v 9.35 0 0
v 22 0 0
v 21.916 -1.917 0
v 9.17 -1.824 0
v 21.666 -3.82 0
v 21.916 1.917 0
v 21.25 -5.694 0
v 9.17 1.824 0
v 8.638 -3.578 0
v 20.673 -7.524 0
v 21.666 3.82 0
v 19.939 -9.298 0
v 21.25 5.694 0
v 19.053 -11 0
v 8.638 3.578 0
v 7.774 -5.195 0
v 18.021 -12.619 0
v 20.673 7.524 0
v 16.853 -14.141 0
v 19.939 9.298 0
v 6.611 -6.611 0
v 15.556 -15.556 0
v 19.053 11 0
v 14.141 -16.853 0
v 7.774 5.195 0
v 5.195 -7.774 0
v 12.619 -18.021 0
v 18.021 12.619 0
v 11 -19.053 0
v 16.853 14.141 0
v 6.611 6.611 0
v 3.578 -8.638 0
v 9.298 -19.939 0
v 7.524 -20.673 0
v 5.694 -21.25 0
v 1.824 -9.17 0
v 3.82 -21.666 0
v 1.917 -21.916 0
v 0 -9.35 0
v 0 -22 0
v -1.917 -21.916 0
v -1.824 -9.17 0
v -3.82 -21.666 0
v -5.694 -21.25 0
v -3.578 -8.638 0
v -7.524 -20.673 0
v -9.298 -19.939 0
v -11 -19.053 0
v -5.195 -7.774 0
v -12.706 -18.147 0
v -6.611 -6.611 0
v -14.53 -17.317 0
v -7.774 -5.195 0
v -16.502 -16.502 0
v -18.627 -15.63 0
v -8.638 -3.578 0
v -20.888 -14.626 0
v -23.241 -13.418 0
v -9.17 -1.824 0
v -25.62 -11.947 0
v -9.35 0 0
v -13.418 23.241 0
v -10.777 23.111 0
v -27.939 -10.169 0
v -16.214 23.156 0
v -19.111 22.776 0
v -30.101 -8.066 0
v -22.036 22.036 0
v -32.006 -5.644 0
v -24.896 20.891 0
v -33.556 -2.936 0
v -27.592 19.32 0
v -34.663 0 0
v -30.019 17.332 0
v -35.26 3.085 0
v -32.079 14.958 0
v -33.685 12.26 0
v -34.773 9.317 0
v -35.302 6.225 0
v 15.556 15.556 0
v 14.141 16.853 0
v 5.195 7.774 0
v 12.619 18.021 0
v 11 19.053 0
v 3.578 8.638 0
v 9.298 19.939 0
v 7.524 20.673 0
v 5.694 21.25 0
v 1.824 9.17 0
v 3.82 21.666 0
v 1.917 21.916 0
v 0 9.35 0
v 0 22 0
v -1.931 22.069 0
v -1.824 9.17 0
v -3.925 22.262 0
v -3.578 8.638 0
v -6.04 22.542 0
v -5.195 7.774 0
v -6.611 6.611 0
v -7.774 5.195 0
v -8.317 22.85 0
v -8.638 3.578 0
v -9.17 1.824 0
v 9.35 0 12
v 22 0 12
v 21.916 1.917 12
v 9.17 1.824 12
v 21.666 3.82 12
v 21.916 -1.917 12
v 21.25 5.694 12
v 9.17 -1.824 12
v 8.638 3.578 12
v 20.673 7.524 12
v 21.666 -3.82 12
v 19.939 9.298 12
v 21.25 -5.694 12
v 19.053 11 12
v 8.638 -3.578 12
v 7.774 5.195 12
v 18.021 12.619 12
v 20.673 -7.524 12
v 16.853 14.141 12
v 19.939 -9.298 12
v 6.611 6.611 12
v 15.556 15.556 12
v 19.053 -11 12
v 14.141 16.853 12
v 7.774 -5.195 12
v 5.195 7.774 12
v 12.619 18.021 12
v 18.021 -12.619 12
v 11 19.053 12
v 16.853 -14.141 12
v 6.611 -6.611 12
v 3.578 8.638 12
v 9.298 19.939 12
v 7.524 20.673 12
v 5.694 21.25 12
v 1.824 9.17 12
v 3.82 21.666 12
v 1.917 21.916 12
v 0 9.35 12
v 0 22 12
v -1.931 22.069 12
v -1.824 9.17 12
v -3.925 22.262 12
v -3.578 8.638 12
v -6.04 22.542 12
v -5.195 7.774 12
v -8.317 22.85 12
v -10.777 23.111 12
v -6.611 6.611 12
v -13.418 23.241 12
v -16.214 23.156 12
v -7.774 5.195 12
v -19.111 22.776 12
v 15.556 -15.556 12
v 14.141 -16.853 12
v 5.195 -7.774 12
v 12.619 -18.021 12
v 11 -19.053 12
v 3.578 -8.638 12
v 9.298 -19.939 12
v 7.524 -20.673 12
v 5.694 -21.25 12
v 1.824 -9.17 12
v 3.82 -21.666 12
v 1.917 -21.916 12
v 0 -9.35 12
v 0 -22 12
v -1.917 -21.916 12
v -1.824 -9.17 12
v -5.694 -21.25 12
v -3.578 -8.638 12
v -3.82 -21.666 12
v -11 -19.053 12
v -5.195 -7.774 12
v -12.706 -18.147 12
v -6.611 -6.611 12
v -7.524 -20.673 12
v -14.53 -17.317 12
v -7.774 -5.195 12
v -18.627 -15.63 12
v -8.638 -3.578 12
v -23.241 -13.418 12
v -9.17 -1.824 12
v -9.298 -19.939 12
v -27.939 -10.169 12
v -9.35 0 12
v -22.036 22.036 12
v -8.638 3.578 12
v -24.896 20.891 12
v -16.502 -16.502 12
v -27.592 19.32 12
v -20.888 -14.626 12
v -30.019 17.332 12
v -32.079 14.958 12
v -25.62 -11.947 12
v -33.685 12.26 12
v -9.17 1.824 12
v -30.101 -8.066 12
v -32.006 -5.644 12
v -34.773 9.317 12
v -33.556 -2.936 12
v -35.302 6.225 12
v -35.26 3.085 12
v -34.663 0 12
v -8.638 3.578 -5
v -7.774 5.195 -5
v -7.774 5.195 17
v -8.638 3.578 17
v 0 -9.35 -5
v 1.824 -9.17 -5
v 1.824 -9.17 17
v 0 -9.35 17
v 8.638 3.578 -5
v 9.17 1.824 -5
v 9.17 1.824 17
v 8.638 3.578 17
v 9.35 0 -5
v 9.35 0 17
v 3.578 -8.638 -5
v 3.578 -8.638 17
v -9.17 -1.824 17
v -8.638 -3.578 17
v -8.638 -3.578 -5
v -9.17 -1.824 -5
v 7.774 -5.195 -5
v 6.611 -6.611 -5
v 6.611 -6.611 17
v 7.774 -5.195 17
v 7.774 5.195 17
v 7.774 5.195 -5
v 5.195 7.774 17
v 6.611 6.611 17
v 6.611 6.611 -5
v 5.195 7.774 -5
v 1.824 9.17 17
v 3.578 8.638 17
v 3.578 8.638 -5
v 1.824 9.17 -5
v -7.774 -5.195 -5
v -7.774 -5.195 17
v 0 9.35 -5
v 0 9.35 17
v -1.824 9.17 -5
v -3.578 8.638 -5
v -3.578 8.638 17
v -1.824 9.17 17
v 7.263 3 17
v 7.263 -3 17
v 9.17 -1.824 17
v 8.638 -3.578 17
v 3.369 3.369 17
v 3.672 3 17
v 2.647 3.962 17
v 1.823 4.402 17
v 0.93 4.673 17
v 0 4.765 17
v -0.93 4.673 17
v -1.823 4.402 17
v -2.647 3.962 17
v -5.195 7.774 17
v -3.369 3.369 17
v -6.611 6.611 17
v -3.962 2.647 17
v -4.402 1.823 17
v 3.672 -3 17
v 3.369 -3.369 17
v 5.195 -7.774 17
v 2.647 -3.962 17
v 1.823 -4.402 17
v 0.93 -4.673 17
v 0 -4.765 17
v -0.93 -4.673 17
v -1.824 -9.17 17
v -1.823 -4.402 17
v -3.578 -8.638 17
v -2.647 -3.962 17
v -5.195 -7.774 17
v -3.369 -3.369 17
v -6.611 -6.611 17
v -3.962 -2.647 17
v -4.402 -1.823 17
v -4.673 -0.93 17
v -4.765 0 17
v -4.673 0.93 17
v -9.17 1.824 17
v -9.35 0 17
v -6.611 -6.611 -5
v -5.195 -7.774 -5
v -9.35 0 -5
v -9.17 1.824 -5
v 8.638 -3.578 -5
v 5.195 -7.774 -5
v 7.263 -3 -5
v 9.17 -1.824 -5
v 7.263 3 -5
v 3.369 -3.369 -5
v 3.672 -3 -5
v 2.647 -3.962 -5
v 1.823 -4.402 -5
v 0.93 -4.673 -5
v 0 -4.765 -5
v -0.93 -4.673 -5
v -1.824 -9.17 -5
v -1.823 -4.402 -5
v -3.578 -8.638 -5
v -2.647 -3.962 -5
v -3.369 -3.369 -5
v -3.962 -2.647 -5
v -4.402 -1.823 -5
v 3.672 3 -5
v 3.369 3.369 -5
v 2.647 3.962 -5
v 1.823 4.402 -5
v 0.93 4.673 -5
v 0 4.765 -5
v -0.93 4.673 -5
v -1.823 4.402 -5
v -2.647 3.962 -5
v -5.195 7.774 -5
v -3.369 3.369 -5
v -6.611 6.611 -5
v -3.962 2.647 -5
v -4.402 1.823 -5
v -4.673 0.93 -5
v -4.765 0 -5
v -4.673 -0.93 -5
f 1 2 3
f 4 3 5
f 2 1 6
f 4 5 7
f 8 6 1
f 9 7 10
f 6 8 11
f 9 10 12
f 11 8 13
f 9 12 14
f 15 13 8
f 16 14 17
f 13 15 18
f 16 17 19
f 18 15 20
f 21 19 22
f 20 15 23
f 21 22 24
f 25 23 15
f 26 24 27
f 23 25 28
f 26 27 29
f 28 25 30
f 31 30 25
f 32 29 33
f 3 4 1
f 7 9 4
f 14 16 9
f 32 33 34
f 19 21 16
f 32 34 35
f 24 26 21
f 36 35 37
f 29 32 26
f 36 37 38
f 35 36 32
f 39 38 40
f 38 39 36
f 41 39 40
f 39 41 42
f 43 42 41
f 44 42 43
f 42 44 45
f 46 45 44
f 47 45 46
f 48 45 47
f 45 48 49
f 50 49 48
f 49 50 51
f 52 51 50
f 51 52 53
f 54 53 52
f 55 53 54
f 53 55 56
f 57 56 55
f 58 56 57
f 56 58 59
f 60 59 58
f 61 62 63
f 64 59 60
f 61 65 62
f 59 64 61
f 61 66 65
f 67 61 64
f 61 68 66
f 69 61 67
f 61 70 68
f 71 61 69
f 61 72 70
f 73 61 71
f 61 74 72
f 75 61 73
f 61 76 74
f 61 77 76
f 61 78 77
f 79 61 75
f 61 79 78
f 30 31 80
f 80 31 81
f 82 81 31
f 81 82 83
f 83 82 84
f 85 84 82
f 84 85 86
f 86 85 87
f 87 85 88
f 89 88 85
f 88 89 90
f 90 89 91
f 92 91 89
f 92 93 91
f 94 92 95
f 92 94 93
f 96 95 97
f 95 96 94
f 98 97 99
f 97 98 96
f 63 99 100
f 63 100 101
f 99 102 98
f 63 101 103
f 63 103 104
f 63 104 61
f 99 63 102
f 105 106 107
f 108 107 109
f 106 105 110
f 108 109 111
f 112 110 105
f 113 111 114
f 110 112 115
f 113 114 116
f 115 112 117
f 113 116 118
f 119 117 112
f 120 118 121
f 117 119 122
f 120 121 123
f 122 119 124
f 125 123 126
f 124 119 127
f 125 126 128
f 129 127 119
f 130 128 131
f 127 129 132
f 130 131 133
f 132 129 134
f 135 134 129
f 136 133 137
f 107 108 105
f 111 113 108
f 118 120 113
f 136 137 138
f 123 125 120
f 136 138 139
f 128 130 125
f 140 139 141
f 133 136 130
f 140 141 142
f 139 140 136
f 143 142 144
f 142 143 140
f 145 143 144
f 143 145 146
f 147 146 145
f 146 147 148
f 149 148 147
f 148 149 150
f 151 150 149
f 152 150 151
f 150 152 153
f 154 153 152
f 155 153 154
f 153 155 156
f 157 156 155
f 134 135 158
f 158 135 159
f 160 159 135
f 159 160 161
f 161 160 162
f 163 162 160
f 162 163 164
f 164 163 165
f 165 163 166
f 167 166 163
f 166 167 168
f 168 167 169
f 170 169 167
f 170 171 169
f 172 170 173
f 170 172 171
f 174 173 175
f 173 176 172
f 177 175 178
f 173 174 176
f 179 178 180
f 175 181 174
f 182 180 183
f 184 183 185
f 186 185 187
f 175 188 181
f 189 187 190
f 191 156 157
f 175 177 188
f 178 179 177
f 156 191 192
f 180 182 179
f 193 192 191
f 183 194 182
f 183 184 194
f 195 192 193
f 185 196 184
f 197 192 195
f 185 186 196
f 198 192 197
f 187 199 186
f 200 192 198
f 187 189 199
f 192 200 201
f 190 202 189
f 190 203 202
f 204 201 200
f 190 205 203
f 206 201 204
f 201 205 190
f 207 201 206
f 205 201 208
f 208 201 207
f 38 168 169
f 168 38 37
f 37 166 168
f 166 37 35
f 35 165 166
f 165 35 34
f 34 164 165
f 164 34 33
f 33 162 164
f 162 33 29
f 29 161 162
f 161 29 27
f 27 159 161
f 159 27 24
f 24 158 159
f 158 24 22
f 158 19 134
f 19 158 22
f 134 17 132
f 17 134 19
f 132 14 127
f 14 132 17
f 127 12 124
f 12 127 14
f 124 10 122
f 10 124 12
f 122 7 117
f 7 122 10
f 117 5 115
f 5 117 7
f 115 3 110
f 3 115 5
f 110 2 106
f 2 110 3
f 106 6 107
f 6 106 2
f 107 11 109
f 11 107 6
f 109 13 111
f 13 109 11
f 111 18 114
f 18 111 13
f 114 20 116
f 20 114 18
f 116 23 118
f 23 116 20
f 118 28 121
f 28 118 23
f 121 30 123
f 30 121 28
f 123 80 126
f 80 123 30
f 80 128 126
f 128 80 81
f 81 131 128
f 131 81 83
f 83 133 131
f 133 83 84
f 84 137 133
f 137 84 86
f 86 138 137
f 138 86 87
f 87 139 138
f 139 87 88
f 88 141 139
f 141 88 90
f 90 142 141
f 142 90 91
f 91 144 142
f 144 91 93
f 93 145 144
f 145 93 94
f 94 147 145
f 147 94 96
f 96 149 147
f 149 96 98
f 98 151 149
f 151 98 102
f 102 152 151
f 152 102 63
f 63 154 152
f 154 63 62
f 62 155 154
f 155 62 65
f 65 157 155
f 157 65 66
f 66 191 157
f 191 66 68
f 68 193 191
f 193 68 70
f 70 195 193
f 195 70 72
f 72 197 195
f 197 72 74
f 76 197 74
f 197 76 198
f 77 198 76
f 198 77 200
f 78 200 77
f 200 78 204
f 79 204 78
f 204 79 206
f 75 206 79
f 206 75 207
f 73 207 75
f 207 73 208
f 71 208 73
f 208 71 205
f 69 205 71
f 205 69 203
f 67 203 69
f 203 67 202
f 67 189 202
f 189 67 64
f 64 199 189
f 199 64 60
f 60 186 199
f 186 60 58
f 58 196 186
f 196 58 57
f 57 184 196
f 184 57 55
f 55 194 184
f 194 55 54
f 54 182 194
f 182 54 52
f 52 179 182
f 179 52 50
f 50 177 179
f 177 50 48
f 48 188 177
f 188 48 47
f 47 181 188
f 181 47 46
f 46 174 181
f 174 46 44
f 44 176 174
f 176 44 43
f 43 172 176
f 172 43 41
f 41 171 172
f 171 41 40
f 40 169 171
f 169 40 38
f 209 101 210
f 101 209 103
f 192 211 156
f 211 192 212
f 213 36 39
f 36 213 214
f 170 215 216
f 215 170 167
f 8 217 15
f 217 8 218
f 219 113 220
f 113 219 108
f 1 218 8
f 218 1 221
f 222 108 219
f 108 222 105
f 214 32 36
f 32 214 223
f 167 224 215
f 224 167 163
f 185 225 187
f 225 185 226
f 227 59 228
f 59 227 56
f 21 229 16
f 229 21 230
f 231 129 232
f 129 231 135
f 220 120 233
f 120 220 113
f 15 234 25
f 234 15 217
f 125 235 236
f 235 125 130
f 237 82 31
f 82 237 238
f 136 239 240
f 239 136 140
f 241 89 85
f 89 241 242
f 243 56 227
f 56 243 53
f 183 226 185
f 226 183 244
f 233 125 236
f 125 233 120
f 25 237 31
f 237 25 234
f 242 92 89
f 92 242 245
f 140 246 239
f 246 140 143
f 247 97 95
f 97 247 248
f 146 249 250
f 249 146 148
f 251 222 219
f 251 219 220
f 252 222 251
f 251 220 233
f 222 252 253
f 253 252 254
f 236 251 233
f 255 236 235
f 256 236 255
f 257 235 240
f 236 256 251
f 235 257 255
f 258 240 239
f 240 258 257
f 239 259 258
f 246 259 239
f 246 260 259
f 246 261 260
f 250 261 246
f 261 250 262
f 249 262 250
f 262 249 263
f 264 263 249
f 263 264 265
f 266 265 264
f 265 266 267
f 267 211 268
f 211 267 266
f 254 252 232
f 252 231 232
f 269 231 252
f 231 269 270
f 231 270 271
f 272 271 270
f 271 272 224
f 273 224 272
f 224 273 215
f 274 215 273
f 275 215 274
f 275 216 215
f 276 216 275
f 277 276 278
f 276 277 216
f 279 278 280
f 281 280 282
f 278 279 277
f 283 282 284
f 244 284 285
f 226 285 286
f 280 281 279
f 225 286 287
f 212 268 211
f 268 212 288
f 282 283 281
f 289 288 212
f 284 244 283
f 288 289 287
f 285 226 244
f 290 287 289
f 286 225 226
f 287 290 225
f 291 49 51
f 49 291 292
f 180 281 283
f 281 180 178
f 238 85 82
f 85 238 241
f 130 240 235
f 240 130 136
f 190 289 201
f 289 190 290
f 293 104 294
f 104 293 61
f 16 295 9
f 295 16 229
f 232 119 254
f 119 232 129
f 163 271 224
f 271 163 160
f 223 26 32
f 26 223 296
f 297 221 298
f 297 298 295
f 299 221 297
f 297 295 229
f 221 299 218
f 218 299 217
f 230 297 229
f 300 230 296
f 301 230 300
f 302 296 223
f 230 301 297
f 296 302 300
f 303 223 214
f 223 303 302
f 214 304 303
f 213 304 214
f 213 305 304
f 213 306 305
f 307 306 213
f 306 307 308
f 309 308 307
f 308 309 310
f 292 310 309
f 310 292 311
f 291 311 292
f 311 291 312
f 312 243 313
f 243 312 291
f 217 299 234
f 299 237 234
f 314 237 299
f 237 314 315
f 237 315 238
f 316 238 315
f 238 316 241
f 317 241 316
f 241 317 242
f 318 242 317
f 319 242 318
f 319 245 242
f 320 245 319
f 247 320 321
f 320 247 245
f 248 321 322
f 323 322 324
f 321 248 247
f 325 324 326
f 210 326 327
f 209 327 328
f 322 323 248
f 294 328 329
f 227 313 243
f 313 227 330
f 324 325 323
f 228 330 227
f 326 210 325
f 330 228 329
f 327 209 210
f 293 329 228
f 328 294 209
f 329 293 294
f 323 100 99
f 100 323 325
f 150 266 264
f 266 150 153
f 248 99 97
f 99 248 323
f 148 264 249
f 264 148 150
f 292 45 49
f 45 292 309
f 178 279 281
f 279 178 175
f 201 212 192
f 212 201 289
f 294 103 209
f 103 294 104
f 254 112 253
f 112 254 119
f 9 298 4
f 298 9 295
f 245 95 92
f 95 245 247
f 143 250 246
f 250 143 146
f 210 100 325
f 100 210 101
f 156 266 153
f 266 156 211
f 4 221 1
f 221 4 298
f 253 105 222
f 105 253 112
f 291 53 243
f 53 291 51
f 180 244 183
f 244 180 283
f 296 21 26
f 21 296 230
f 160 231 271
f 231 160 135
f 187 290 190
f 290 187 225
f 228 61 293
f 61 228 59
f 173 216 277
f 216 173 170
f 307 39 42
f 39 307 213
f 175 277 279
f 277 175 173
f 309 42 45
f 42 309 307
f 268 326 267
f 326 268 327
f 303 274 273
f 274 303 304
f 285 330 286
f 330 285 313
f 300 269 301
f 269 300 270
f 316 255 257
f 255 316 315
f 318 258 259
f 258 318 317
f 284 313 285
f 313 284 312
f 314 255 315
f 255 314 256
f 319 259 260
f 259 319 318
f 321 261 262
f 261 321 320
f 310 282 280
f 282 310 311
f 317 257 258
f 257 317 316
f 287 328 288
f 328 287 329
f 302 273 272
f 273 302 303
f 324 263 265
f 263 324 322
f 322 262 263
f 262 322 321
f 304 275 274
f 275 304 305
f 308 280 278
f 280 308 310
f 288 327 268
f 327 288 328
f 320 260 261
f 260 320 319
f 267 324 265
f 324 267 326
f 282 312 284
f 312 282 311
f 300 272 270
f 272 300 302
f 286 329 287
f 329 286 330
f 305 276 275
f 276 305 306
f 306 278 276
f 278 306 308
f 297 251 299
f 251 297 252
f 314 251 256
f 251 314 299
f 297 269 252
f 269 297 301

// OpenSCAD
$fn = 32;

// ----------------------------------------------------------------------
// Cam: base radius 22 mm with a 14 mm lift over 150 degrees
// ----------------------------------------------------------------------

// --- parameters (mm) ---
base_r = 22;              // base radius
lift = 14;                // lift height above the base radius
lift_span = 150;          // angular width of the lift
lift_start = 90;          // angle where the lift starts
cam_t = 12;               // cam plate thickness
hub_d = 18.7;             // hub diameter
hub_h = 22;               // hub height
bore_d = 9.53;            // bore
key_w = 6;                // keyway width
key_depth = 2.59;         // keyway depth

cam_profile = [[22, 0], [21.916, 1.917], [21.666, 3.82], [21.25, 5.694], [20.673, 7.524], [19.939, 9.298], [19.053, 11], [18.021, 12.619], [16.853, 14.141], [15.556, 15.556], [14.141, 16.853], [12.619, 18.021], [11, 19.053], [9.298, 19.939], [7.524, 20.673], [5.694, 21.25], [3.82, 21.666], [1.917, 21.916], [0, 22], [-1.931, 22.069], [-3.925, 22.262], [-6.04, 22.542], [-8.317, 22.85], [-10.777, 23.111], [-13.418, 23.241], [-16.214, 23.156], [-19.111, 22.776], [-22.036, 22.036], [-24.896, 20.891], [-27.592, 19.32], [-30.019, 17.332], [-32.079, 14.958], [-33.685, 12.26], [-34.773, 9.317], [-35.302, 6.225], [-35.26, 3.085], [-34.663, 0], [-33.556, -2.936], [-32.006, -5.644], [-30.101, -8.066], [-27.939, -10.169], [-25.62, -11.947], [-23.241, -13.418], [-20.888, -14.626], [-18.627, -15.63], [-16.502, -16.502], [-14.53, -17.317], [-12.706, -18.147], [-11, -19.053], [-9.298, -19.939], [-7.524, -20.673], [-5.694, -21.25], [-3.82, -21.666], [-1.917, -21.916], [0, -22], [1.917, -21.916], [3.82, -21.666], [5.694, -21.25], [7.524, -20.673], [9.298, -19.939], [11, -19.053], [12.619, -18.021], [14.141, -16.853], [15.556, -15.556], [16.853, -14.141], [18.021, -12.619], [19.053, -11], [19.939, -9.298], [20.673, -7.524], [21.25, -5.694], [21.666, -3.82], [21.916, -1.917]];

difference() {
  union() {
    linear_extrude(height = cam_t) polygon(cam_profile);
    /* hub, proud of the cam plate on both sides */
    translate([0, 0, -5]) cylinder(h = hub_h, d = hub_d);
  }
  /* bore through the hub, 2.5 mm clear on both faces */
  translate([0, 0, -7.5]) cylinder(h = hub_h + 5, d = bore_d);
  /* keyway, milled through the whole hub */
  translate([2.173, -3, -7.5]) cube([5.09, 6, 27]);
}
